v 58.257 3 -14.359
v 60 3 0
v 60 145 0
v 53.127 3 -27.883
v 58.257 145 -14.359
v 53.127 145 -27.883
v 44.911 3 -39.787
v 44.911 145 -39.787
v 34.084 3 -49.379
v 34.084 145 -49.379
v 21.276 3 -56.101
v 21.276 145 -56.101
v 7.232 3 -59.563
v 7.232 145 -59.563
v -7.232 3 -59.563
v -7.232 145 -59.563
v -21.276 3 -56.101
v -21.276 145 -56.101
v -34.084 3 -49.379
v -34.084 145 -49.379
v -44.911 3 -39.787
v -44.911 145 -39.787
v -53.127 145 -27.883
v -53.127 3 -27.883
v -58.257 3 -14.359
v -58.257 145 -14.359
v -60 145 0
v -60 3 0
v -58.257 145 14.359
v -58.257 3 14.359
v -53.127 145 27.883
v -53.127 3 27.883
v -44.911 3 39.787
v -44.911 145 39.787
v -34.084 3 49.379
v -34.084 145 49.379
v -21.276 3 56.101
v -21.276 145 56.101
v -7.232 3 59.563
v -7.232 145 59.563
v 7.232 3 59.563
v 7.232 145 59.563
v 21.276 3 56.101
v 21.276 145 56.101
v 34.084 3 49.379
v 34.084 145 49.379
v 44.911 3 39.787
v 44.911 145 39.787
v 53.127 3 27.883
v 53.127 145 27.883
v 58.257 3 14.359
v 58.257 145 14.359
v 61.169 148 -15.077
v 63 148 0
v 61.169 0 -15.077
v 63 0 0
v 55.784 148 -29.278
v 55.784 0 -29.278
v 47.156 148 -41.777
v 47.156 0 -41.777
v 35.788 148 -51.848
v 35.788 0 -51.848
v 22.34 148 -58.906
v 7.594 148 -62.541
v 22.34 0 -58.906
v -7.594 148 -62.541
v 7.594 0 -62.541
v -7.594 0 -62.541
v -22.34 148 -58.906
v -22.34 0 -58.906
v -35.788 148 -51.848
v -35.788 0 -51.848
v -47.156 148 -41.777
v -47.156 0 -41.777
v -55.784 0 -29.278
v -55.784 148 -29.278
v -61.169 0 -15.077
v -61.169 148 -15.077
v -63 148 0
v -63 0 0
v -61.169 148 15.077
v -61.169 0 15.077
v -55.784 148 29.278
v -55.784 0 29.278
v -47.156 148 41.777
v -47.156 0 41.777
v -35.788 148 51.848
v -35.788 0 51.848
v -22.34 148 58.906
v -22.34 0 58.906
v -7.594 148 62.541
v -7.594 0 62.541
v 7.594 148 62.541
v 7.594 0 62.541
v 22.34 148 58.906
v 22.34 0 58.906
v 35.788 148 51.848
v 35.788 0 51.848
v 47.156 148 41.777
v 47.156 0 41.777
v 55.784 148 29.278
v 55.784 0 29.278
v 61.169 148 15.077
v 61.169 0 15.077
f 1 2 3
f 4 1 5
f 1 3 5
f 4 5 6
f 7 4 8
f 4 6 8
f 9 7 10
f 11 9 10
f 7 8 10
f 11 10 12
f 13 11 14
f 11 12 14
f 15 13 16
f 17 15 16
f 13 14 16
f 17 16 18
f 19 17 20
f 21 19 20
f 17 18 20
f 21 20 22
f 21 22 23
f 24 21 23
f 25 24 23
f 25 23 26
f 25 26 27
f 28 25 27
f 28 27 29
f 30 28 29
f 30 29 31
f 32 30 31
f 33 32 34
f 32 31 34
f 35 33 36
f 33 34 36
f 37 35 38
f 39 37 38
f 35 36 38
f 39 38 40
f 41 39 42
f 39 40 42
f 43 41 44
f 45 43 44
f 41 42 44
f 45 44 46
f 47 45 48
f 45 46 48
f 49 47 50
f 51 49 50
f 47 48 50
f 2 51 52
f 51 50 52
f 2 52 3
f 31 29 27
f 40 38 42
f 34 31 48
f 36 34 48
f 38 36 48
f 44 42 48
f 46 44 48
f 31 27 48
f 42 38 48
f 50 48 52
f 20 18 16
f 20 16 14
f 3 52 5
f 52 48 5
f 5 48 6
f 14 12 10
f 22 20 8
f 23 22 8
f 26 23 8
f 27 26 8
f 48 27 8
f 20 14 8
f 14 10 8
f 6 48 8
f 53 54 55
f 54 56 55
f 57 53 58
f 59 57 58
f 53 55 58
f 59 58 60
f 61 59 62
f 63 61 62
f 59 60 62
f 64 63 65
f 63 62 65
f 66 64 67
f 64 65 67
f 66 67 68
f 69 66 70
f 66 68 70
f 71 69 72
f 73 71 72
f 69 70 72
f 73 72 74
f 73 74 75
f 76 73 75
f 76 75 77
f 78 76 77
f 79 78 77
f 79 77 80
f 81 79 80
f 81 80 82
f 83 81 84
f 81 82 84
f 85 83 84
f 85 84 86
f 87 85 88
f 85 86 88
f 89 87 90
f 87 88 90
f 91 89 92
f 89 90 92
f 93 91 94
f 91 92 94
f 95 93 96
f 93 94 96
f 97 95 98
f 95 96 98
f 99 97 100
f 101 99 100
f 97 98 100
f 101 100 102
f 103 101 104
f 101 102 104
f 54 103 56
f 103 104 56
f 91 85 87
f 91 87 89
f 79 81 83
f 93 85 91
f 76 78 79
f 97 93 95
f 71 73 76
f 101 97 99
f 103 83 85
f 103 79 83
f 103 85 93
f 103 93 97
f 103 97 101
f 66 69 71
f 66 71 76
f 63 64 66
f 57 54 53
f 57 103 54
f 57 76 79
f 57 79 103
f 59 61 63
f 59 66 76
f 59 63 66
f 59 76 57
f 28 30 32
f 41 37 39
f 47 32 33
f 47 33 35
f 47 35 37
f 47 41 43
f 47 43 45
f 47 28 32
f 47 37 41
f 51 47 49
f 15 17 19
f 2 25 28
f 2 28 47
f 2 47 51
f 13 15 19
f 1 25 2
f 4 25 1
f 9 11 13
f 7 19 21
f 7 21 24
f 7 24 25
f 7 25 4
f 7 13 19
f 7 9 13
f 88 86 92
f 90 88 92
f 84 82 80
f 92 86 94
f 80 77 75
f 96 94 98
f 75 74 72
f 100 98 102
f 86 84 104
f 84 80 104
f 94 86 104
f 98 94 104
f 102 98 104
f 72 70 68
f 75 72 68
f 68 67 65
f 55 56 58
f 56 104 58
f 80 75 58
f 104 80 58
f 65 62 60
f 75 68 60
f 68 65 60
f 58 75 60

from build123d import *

# Parameters (mm, degrees)
CROQUIS1_R                 = 63
SALIENTE_EXTRUIR1_DEPTH    = 145
CROQUIS2_R                 = 60
CORTAR_EXTRUIR1_DEPTH      = 2
CORTAR_EXTRUIR1_DEPTH_BACK = 142
CROQUIS3_R                 = 63
SALIENTE_EXTRUIR2_DEPTH    = 3


with BuildPart() as part:
    # Croquis1 → Saliente-Extruir1 (new body)
    with BuildSketch(Plane(origin=(0, 0, 0), x_dir=(1, 0, 0), z_dir=(0, 1, 0))):
        Circle(CROQUIS1_R)
    extrude(amount=SALIENTE_EXTRUIR1_DEPTH)

    # Croquis2 → Cortar-Extruir1 (cut, two sides)
    with BuildSketch(Plane(origin=(0, 145, 0), x_dir=(1, 0, 0), z_dir=(0, 1, 0))) as cortar_extruir1_sk:
        Circle(CROQUIS2_R)
    extrude(amount=CORTAR_EXTRUIR1_DEPTH, mode=Mode.SUBTRACT)
    extrude(cortar_extruir1_sk.sketch, amount=-CORTAR_EXTRUIR1_DEPTH_BACK, mode=Mode.SUBTRACT)

    # Croquis3 → Saliente-Extruir2 (add)
    with BuildSketch(Plane(origin=(0, 145, 0), x_dir=(1, 0, 0), z_dir=(0, 1, 0))):
        Circle(CROQUIS3_R)
    extrude(amount=SALIENTE_EXTRUIR2_DEPTH)


solid = part.part
